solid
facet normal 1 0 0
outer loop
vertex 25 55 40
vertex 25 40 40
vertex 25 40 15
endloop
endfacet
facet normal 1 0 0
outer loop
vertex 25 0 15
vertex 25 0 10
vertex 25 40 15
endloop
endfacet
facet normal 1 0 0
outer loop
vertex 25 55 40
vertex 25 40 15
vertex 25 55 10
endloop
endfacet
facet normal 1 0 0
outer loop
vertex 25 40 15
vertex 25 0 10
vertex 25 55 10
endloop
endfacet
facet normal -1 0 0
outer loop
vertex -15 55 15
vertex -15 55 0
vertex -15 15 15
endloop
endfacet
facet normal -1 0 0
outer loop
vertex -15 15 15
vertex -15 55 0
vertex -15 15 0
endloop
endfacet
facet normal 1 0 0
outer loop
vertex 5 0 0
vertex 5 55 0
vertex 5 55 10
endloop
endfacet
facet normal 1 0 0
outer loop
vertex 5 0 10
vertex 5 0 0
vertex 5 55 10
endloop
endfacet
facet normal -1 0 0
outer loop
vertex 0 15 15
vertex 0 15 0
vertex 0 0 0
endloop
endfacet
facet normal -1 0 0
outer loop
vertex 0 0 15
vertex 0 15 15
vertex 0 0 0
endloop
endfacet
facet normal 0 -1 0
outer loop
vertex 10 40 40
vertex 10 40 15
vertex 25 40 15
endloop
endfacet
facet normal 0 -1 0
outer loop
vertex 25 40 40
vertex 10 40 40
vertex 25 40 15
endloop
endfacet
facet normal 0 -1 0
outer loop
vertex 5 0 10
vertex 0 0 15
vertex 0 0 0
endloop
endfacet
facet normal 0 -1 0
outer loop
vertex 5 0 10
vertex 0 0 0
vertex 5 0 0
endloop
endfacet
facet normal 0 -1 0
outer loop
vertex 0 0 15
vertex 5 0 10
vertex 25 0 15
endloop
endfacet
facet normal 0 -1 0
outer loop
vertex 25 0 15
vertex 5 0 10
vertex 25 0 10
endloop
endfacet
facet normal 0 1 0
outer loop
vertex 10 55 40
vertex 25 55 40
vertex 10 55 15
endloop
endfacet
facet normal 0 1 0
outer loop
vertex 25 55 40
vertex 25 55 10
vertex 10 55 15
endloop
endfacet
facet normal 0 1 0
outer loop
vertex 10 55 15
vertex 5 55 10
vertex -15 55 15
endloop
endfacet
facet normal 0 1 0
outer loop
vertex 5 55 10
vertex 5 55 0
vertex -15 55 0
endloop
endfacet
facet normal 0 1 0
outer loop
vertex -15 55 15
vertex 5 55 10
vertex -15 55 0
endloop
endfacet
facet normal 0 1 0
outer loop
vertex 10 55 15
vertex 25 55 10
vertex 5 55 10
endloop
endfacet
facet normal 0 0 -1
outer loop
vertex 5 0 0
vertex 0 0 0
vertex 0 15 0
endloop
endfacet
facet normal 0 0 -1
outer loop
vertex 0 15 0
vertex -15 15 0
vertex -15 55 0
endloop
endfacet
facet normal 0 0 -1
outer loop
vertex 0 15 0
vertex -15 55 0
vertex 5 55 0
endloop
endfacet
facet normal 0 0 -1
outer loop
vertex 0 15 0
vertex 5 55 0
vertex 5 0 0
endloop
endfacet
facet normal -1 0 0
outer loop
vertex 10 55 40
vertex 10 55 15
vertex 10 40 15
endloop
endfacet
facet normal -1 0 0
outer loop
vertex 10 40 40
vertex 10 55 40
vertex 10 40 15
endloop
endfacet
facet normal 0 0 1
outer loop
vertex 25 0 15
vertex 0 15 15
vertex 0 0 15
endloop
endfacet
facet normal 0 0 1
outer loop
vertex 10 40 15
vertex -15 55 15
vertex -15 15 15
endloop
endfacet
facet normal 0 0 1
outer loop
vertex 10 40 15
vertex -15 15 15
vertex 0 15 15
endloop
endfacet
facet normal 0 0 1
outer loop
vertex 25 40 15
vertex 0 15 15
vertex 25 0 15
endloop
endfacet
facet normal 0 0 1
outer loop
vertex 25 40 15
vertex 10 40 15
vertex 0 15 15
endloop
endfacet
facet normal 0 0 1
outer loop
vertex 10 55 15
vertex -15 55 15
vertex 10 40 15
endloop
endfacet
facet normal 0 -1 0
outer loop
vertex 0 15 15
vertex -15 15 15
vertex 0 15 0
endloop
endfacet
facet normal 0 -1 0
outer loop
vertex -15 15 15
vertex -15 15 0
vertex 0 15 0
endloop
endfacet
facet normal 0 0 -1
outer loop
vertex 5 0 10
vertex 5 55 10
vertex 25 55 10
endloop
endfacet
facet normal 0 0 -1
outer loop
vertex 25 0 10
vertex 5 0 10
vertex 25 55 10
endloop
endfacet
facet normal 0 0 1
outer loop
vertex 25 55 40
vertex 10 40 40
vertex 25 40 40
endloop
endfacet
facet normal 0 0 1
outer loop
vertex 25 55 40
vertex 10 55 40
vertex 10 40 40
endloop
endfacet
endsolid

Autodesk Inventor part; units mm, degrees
ref_plane "YZ Plane" through (0, 0, 0) normal (1, 0, 0) x (0, 1, 0)
ref_plane "XZ Plane" through (0, 0, 0) normal (0, 1, 0) x (-1, 0, 0)
ref_plane "XY Plane" through (0, 0, 0) normal (0, 0, 1) x (1, 0, 0)
sketch "Náčrt3" plane through (0, 0, 0) normal (0, 0, 1) x (1, 0, 0)
  line L0 (0, 0) -> (25, 0)
  line L1 (25, 0) -> (25, 55)
  line L2 (25, 55) -> (-15, 55)
  line L3 (-15, 55) -> (-15, 15)
  line L4 (-15, 15) -> (0, 15)
  line L5 (0, 15) -> (0, 0)
  dimension "d7" = 25
  dimension "d8" = 55
  dimension "d9" = 40
  dimension "d10" = 40
  dimension "d11" = 15
extrude "Vysunutí2" add sketch "Náčrt3" along normal blind 15
sketch "Náčrt4" plane through (0, 0, 15) normal (0, 0, 1) x (1, 0, 0)
  line L0 (25, 55) -> (-15, 55) projected
  line L1 (25, 55) -> (10, 55)
  line L2 (10, 55) -> (10, 40)
  line L3 (10, 40) -> (25, 40)
  line L4 (25, 40) -> (25, 55)
  point P0 (0, 0)
  dimension "d14" = 15
  dimension "d15" = 15
extrude "Vysunutí3" add sketch "Náčrt4" along normal blind 25
sketch "Náčrt5" plane through (-15, 55, 0) normal (0, 1, 0) x (1, 0, 0)
  point P0 (15, 0)
sketch "Náčrt6" plane through (-15, 55, 0) normal (0, 1, 0) x (1, 0, 0)
  line L0 (40, 0) -> (0, 0) projected
  line L1 (40, 0) -> (20, 0)
  line L2 (20, 0) -> (20, -10)
  line L3 (20, -10) -> (40, -10)
  line L4 (40, -10) -> (40, 0)
  point P0 (15, 0)
  dimension "d18" = 20
  dimension "d19" = 10
extrude "Vysunutí4" cut sketch "Náčrt6" against normal through all
properties part number "Součást1"
